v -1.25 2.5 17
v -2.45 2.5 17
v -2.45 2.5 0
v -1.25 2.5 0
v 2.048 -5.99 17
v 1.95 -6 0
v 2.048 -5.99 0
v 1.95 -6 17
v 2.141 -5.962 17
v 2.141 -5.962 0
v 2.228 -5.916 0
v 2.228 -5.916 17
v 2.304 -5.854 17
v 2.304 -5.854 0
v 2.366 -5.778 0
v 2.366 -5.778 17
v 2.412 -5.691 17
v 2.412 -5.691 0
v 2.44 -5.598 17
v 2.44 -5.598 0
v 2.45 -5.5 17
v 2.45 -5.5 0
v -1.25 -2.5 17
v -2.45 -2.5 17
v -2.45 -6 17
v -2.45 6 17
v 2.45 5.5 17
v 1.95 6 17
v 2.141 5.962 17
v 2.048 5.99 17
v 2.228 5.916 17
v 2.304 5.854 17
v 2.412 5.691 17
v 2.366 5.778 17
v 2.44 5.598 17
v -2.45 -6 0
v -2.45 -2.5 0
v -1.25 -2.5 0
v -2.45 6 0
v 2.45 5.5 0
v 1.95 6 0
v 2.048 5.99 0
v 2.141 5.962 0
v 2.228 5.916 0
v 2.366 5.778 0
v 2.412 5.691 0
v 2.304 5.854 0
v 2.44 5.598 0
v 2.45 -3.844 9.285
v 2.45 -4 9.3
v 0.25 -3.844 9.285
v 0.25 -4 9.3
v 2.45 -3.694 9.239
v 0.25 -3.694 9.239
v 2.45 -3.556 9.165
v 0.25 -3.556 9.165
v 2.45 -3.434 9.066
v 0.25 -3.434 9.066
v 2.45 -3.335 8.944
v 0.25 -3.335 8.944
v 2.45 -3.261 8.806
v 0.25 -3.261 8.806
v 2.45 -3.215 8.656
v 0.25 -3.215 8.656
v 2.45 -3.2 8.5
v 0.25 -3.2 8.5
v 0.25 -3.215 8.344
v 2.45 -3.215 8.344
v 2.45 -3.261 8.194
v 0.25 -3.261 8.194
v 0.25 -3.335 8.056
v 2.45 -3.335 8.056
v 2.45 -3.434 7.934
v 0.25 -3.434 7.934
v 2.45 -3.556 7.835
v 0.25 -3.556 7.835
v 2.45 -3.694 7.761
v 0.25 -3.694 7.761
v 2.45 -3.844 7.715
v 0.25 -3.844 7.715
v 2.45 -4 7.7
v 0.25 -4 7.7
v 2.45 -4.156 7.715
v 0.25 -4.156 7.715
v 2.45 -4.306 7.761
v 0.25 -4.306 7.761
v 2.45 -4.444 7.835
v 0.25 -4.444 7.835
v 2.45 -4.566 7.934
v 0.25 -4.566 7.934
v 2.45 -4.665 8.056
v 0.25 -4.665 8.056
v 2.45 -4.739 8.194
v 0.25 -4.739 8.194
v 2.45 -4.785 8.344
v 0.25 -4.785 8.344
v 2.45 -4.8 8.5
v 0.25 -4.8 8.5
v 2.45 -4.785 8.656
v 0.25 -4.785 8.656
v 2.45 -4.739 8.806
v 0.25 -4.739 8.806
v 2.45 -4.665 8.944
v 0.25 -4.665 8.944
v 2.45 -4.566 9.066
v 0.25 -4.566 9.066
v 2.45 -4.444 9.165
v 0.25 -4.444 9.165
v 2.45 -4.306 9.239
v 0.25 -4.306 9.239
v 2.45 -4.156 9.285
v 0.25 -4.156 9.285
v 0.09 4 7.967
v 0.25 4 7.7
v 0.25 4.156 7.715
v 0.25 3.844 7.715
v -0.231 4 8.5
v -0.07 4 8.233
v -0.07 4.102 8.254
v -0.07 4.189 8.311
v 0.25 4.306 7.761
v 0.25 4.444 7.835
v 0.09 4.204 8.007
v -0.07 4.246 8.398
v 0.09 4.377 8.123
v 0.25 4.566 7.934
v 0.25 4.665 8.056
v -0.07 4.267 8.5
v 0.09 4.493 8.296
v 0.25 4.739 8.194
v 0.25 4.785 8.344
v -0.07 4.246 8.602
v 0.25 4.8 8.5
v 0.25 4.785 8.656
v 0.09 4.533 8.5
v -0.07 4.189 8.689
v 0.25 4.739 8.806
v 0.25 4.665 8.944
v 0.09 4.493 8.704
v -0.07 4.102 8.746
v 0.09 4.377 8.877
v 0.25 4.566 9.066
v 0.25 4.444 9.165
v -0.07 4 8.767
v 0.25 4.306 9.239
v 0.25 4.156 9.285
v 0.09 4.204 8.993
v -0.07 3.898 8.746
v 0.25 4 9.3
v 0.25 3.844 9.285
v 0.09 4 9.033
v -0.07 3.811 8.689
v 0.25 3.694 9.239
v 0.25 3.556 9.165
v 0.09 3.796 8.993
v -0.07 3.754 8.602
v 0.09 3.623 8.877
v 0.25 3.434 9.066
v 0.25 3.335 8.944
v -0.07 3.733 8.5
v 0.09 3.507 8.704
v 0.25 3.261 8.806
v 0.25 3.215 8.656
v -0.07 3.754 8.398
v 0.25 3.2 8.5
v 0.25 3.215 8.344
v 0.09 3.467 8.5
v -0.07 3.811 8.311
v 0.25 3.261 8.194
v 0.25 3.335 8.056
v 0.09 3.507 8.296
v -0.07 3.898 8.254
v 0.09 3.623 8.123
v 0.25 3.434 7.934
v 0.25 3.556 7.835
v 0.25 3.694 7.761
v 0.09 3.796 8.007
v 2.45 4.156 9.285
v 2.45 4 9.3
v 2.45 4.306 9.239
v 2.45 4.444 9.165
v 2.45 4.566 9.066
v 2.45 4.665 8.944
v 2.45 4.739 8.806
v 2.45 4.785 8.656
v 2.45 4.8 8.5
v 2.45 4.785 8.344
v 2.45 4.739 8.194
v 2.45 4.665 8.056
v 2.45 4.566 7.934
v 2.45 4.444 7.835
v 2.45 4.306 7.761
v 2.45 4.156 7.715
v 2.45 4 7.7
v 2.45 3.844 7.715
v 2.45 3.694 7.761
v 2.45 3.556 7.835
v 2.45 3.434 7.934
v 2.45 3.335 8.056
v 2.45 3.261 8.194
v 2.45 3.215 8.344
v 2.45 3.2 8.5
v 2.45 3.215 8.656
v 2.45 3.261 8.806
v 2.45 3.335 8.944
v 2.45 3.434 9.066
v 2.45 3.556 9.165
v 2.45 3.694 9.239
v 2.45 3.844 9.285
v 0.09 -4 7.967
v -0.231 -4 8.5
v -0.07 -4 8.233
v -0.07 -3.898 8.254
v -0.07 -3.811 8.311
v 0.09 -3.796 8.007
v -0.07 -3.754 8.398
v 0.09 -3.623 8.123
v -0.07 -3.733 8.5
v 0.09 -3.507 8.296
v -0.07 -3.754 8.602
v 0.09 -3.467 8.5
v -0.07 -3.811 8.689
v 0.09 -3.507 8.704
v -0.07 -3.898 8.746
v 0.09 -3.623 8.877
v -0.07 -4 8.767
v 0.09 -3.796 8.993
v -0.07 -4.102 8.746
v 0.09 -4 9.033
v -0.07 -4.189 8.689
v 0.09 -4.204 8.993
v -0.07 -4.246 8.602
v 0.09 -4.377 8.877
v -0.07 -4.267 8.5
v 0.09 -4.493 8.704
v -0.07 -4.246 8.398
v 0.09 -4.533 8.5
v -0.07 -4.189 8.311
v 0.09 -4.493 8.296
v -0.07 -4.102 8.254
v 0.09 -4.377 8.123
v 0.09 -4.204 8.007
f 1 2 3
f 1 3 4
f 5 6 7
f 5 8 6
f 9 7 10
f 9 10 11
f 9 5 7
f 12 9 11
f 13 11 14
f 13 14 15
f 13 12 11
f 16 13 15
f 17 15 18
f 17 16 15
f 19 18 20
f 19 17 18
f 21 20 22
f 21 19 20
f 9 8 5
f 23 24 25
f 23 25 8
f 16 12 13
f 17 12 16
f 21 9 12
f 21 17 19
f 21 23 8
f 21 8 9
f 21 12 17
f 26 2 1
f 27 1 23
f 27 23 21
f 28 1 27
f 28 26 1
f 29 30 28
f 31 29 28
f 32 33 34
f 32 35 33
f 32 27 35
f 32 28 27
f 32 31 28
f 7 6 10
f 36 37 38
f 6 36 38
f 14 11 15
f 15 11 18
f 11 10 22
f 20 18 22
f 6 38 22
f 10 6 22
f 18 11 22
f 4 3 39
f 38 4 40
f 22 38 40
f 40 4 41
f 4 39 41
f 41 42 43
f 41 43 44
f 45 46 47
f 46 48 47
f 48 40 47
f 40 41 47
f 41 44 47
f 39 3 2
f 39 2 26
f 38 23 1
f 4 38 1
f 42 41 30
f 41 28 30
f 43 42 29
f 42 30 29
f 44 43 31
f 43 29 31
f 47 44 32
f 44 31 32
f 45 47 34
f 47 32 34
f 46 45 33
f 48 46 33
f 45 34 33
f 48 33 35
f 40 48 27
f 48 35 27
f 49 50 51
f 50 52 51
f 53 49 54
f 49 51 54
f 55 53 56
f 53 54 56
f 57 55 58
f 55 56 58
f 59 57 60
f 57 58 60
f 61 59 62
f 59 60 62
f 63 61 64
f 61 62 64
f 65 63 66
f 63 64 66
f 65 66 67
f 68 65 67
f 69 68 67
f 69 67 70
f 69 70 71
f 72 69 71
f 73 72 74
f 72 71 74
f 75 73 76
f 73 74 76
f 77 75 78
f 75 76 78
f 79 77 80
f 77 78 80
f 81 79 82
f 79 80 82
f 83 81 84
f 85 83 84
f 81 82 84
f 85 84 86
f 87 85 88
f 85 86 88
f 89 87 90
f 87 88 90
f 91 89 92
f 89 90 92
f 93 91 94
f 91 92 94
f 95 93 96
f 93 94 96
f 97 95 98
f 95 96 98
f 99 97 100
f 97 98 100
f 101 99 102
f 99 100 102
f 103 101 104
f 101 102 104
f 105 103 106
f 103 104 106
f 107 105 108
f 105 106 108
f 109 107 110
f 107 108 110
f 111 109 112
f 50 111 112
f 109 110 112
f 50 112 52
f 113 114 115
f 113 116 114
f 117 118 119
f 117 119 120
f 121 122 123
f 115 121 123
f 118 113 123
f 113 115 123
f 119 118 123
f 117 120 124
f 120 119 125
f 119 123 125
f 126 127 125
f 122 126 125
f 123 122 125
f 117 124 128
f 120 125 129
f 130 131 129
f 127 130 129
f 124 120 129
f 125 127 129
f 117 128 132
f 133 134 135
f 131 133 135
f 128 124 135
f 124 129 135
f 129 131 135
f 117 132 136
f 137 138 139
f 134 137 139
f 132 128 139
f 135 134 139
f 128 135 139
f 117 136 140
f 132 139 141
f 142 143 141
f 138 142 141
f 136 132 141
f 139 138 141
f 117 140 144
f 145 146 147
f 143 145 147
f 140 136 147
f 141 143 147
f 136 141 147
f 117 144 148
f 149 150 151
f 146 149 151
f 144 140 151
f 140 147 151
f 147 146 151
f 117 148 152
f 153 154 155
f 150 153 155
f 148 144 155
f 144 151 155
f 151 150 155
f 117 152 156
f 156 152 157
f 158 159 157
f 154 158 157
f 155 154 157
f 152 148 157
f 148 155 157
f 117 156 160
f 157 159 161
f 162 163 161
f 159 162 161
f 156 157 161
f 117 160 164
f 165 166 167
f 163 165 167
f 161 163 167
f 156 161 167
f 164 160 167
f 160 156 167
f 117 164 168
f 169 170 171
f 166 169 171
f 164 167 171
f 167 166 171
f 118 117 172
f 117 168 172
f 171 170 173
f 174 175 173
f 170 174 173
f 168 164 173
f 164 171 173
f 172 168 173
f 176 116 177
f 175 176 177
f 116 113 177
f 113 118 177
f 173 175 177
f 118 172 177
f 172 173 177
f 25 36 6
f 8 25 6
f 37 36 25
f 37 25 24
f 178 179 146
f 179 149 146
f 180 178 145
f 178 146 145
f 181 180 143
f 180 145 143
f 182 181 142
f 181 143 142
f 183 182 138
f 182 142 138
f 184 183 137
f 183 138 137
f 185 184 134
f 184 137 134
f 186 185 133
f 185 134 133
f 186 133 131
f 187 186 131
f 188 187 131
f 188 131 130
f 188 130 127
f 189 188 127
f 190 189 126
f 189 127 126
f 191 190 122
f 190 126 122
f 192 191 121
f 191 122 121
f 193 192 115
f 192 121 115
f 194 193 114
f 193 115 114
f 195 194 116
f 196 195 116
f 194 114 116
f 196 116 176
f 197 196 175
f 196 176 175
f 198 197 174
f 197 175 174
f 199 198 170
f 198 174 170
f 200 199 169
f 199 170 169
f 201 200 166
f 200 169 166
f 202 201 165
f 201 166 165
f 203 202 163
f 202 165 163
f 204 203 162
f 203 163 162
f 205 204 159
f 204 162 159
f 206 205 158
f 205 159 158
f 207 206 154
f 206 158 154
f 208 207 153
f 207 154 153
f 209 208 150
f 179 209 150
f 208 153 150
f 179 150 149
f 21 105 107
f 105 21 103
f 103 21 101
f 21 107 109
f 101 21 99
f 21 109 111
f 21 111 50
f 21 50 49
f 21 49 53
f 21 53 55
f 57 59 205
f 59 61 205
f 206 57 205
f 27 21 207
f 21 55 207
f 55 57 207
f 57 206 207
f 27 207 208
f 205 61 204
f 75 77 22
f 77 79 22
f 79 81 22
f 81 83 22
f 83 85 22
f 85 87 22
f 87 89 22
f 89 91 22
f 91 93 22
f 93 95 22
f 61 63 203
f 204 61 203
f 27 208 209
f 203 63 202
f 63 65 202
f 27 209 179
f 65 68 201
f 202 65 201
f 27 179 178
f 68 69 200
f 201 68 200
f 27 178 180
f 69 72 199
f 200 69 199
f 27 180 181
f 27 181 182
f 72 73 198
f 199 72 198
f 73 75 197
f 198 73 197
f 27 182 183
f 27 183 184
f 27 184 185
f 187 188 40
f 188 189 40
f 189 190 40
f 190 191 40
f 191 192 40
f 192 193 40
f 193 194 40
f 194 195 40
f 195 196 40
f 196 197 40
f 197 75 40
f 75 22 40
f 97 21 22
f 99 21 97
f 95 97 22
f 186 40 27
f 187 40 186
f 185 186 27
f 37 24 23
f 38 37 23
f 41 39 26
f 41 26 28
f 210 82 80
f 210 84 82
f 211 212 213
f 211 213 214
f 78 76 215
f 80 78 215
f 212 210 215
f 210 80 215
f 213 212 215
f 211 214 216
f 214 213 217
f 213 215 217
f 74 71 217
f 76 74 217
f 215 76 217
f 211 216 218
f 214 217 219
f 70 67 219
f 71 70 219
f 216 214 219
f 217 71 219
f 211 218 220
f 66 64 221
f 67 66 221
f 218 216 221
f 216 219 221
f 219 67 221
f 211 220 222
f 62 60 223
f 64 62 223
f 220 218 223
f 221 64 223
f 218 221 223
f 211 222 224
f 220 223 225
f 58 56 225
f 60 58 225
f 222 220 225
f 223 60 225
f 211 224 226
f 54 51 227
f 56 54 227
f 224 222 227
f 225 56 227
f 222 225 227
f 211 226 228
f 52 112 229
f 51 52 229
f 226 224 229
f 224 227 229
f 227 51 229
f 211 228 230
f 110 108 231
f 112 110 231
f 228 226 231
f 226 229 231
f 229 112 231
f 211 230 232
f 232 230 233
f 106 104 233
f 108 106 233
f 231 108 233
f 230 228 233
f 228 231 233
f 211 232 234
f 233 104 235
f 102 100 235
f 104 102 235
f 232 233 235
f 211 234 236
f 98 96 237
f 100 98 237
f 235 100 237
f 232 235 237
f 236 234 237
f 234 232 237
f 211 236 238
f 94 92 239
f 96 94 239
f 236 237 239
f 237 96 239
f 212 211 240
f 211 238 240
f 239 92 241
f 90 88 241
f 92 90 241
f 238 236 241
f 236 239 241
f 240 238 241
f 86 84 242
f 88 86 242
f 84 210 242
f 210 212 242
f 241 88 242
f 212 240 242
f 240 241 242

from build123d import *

# Parameters (mm, degrees)
SKETCH_1_W             = 4.9
SKETCH_1_H             = 12
EXTRUDE_1_DEPTH        = 17
SKETCH_2_W             = 1.2
SKETCH_2_H             = 5
CUT_EXTRUDE_1_DEPTH    = 18
FILLET_1_R             = 0.5
HOLE_WIZARD_M2_1_D     = 1.6
HOLE_WIZARD_M2_1_DEPTH = 2.2
HOLE_WIZARD_M2_1_TIP   = 0.480688495


with BuildPart() as part:
    # 草图1 → 凸台-拉伸1 (new body)
    with BuildSketch(Plane.XY):
        Rectangle(SKETCH_1_W, SKETCH_1_H)
    extrude(amount=EXTRUDE_1_DEPTH)

    # 草图2 → 切除-拉伸1 (cut, through all)
    with BuildSketch(Plane.XY.offset(17)):
        with Locations((-1.85, 0)):
            Rectangle(SKETCH_2_W, SKETCH_2_H)
    extrude(amount=-CUT_EXTRUDE_1_DEPTH, mode=Mode.SUBTRACT)

    # 圆角1
    fillet_1_edges = [part.edges().sort_by_distance(p)[0] for p in [
        (2.45, 6, 8.5),
        (2.45, -6, 8.5),
    ]]
    fillet(fillet_1_edges, radius=FILLET_1_R)

    # M2 螺纹孔1
    with Locations(Plane(origin=(2.45, 0, 0), x_dir=(0, 0, -1), z_dir=(1, 0, 0))):
        with Locations((-8.5, 4), (-8.5, -4)):
            Hole(HOLE_WIZARD_M2_1_D / 2, depth=HOLE_WIZARD_M2_1_DEPTH)
            with Locations((0, 0, -(HOLE_WIZARD_M2_1_DEPTH + HOLE_WIZARD_M2_1_TIP / 2))):  # 118° drill point
                Cone(0, HOLE_WIZARD_M2_1_D / 2, HOLE_WIZARD_M2_1_TIP, mode=Mode.SUBTRACT)


solid = part.part
